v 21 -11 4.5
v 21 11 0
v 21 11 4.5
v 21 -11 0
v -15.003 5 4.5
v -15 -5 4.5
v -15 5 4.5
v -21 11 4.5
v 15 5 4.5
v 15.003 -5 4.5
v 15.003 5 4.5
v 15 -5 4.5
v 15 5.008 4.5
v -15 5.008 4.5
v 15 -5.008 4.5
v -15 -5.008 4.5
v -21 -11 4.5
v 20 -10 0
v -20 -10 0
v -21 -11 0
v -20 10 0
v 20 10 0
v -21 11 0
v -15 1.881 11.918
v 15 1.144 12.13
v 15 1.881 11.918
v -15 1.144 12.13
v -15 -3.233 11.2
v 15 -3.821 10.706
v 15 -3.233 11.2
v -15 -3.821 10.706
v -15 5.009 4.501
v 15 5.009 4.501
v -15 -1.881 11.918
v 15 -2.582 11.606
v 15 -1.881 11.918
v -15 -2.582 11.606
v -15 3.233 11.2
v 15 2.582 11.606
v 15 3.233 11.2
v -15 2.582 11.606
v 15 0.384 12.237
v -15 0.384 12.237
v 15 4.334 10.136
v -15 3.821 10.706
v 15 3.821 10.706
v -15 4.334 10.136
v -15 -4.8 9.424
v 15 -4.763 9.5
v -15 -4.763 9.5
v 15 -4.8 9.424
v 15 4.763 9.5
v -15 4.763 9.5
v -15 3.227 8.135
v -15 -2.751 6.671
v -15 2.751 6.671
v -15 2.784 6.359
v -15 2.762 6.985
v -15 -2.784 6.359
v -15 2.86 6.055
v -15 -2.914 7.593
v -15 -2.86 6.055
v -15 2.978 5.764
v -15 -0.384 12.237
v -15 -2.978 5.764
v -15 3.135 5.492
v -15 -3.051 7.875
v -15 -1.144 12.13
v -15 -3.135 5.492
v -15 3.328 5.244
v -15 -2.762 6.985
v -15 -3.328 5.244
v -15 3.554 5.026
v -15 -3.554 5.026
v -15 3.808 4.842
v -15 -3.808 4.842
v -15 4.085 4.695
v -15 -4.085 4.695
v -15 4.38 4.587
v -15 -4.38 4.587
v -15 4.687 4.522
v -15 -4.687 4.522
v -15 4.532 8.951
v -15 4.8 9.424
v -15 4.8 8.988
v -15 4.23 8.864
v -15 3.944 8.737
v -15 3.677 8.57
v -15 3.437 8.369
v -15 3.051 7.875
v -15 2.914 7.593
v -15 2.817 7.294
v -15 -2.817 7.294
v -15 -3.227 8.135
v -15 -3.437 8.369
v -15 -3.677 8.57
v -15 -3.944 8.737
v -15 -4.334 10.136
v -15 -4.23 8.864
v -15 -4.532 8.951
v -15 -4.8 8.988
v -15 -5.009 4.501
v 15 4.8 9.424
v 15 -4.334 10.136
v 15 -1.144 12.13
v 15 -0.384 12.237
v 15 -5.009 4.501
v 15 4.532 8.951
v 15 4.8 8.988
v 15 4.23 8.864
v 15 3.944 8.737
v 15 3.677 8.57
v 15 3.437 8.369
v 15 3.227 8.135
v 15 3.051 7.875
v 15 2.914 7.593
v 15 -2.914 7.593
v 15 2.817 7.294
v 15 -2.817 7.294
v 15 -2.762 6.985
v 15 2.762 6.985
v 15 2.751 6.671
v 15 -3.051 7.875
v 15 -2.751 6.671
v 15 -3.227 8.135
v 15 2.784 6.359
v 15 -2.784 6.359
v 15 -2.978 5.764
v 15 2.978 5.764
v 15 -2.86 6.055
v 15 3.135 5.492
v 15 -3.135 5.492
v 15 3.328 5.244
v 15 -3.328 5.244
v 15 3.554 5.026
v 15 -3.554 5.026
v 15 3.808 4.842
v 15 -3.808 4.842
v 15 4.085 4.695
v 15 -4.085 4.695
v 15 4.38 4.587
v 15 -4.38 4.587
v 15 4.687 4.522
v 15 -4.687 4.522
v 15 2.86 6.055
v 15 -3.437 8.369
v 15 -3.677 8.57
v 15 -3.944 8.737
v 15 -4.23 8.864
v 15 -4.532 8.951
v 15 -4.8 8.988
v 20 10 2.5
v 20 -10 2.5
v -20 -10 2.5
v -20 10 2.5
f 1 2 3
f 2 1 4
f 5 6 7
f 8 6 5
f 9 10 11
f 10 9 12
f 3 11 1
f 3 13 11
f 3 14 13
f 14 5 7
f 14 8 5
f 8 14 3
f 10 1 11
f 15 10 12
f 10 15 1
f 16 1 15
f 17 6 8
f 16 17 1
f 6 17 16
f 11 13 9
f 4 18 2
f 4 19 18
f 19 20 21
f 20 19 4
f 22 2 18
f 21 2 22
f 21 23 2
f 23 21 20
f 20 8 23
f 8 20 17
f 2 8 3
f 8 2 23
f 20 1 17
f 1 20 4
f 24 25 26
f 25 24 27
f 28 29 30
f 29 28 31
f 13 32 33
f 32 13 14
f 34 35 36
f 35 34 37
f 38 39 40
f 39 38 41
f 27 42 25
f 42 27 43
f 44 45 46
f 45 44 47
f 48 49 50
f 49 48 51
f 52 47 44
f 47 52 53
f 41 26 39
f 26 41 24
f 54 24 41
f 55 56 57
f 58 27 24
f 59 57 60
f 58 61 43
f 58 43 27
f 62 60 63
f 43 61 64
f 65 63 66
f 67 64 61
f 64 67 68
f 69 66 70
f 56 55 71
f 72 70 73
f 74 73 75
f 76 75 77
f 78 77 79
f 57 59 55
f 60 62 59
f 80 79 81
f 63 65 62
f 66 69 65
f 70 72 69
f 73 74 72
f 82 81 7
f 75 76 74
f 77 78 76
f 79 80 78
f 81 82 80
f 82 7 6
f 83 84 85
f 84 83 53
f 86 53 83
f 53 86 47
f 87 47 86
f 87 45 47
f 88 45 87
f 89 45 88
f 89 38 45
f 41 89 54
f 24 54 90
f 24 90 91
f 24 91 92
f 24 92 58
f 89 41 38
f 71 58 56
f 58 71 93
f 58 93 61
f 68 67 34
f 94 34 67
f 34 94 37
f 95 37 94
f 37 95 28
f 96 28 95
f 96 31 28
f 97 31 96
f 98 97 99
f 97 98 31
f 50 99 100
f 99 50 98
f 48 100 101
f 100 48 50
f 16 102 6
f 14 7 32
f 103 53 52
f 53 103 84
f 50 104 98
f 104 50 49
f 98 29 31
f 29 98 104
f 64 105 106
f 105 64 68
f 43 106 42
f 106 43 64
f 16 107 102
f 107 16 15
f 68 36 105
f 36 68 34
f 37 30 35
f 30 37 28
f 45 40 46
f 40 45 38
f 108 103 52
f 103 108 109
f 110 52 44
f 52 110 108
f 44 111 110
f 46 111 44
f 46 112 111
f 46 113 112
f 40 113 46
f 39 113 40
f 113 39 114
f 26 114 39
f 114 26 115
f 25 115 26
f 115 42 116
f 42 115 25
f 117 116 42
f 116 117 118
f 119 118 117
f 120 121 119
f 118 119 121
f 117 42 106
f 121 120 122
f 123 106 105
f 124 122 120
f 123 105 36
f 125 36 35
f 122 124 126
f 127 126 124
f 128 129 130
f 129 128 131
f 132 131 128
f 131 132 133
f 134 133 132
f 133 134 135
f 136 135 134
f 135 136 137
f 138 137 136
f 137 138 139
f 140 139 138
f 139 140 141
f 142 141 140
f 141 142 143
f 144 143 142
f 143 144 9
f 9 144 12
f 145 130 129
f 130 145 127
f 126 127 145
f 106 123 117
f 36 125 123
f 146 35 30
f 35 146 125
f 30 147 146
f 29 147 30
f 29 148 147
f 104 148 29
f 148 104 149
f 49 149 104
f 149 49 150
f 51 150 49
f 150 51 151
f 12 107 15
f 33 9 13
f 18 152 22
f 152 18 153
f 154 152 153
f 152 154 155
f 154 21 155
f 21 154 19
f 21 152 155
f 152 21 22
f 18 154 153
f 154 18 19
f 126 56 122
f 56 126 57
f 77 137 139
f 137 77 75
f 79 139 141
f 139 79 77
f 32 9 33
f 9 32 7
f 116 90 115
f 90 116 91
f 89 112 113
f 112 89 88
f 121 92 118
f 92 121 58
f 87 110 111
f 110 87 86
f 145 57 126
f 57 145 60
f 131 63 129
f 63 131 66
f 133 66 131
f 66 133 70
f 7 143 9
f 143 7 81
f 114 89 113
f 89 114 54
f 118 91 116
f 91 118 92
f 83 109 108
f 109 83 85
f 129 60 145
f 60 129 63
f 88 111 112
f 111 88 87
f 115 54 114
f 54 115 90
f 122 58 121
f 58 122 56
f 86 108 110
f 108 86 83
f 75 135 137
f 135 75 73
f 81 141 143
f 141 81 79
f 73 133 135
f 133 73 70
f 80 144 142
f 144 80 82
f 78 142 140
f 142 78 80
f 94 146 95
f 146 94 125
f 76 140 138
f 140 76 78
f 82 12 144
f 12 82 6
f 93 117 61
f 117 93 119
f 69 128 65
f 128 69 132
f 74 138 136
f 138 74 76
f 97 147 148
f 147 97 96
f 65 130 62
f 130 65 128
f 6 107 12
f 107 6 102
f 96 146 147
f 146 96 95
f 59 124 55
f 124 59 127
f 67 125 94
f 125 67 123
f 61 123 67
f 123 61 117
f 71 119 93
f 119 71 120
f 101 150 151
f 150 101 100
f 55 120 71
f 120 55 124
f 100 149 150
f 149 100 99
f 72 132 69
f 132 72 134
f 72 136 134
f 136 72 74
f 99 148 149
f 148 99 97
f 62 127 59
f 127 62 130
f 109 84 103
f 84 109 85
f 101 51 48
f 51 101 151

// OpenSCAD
overlap=0.006;

plateX=40+2;
plateY=20+2;
plateZ=4.5;

gripDiameter=11;
gripHeight=40-10;

gripCutX=plateX;
gripCutY=1.4;
gripCutZ=5;

holeDiameter=4.5;
holeHeight=gripHeight;
holeZ=gripDiameter/2+plateZ/2-1;

barHolder();

module barHolder(){
    difference()
    {
        union()
        {
            translate([0,0,plateZ/2])
            cube([plateX,plateY,plateZ],center=true);

            translate([0,0,holeZ])
            rotate([0,90,0])
            cylinder(h=gripHeight,d=gripDiameter,center=true, $fn=45);
        }
        union()
        {
            translate([0,0,plateZ/2-2])
            cube([plateX-2,plateY-2,plateZ],center=true);

            color("red")
            translate([0,5,holeDiameter/2+plateZ])
            rotate([0,90,0])
            cylinder(h=holeHeight+overlap,d=holeDiameter,center=true, $fn=45);
            
            color("red")
            translate([0,-5,holeDiameter/2+plateZ])
            rotate([0,90,0])
            cylinder(h=holeHeight+overlap,d=holeDiameter,center=true, $fn=45);
        
            translate([-gripCutX/2,-gripCutY/2+gripDiameter/2,holeZ])
            cube([gripCutX,gripCutY,gripCutZ]);
        
            translate([-gripCutX/2,-gripCutY/2-gripDiameter/2,holeZ])
            cube([gripCutX,gripCutY,gripCutZ]);
        }
    }
}
